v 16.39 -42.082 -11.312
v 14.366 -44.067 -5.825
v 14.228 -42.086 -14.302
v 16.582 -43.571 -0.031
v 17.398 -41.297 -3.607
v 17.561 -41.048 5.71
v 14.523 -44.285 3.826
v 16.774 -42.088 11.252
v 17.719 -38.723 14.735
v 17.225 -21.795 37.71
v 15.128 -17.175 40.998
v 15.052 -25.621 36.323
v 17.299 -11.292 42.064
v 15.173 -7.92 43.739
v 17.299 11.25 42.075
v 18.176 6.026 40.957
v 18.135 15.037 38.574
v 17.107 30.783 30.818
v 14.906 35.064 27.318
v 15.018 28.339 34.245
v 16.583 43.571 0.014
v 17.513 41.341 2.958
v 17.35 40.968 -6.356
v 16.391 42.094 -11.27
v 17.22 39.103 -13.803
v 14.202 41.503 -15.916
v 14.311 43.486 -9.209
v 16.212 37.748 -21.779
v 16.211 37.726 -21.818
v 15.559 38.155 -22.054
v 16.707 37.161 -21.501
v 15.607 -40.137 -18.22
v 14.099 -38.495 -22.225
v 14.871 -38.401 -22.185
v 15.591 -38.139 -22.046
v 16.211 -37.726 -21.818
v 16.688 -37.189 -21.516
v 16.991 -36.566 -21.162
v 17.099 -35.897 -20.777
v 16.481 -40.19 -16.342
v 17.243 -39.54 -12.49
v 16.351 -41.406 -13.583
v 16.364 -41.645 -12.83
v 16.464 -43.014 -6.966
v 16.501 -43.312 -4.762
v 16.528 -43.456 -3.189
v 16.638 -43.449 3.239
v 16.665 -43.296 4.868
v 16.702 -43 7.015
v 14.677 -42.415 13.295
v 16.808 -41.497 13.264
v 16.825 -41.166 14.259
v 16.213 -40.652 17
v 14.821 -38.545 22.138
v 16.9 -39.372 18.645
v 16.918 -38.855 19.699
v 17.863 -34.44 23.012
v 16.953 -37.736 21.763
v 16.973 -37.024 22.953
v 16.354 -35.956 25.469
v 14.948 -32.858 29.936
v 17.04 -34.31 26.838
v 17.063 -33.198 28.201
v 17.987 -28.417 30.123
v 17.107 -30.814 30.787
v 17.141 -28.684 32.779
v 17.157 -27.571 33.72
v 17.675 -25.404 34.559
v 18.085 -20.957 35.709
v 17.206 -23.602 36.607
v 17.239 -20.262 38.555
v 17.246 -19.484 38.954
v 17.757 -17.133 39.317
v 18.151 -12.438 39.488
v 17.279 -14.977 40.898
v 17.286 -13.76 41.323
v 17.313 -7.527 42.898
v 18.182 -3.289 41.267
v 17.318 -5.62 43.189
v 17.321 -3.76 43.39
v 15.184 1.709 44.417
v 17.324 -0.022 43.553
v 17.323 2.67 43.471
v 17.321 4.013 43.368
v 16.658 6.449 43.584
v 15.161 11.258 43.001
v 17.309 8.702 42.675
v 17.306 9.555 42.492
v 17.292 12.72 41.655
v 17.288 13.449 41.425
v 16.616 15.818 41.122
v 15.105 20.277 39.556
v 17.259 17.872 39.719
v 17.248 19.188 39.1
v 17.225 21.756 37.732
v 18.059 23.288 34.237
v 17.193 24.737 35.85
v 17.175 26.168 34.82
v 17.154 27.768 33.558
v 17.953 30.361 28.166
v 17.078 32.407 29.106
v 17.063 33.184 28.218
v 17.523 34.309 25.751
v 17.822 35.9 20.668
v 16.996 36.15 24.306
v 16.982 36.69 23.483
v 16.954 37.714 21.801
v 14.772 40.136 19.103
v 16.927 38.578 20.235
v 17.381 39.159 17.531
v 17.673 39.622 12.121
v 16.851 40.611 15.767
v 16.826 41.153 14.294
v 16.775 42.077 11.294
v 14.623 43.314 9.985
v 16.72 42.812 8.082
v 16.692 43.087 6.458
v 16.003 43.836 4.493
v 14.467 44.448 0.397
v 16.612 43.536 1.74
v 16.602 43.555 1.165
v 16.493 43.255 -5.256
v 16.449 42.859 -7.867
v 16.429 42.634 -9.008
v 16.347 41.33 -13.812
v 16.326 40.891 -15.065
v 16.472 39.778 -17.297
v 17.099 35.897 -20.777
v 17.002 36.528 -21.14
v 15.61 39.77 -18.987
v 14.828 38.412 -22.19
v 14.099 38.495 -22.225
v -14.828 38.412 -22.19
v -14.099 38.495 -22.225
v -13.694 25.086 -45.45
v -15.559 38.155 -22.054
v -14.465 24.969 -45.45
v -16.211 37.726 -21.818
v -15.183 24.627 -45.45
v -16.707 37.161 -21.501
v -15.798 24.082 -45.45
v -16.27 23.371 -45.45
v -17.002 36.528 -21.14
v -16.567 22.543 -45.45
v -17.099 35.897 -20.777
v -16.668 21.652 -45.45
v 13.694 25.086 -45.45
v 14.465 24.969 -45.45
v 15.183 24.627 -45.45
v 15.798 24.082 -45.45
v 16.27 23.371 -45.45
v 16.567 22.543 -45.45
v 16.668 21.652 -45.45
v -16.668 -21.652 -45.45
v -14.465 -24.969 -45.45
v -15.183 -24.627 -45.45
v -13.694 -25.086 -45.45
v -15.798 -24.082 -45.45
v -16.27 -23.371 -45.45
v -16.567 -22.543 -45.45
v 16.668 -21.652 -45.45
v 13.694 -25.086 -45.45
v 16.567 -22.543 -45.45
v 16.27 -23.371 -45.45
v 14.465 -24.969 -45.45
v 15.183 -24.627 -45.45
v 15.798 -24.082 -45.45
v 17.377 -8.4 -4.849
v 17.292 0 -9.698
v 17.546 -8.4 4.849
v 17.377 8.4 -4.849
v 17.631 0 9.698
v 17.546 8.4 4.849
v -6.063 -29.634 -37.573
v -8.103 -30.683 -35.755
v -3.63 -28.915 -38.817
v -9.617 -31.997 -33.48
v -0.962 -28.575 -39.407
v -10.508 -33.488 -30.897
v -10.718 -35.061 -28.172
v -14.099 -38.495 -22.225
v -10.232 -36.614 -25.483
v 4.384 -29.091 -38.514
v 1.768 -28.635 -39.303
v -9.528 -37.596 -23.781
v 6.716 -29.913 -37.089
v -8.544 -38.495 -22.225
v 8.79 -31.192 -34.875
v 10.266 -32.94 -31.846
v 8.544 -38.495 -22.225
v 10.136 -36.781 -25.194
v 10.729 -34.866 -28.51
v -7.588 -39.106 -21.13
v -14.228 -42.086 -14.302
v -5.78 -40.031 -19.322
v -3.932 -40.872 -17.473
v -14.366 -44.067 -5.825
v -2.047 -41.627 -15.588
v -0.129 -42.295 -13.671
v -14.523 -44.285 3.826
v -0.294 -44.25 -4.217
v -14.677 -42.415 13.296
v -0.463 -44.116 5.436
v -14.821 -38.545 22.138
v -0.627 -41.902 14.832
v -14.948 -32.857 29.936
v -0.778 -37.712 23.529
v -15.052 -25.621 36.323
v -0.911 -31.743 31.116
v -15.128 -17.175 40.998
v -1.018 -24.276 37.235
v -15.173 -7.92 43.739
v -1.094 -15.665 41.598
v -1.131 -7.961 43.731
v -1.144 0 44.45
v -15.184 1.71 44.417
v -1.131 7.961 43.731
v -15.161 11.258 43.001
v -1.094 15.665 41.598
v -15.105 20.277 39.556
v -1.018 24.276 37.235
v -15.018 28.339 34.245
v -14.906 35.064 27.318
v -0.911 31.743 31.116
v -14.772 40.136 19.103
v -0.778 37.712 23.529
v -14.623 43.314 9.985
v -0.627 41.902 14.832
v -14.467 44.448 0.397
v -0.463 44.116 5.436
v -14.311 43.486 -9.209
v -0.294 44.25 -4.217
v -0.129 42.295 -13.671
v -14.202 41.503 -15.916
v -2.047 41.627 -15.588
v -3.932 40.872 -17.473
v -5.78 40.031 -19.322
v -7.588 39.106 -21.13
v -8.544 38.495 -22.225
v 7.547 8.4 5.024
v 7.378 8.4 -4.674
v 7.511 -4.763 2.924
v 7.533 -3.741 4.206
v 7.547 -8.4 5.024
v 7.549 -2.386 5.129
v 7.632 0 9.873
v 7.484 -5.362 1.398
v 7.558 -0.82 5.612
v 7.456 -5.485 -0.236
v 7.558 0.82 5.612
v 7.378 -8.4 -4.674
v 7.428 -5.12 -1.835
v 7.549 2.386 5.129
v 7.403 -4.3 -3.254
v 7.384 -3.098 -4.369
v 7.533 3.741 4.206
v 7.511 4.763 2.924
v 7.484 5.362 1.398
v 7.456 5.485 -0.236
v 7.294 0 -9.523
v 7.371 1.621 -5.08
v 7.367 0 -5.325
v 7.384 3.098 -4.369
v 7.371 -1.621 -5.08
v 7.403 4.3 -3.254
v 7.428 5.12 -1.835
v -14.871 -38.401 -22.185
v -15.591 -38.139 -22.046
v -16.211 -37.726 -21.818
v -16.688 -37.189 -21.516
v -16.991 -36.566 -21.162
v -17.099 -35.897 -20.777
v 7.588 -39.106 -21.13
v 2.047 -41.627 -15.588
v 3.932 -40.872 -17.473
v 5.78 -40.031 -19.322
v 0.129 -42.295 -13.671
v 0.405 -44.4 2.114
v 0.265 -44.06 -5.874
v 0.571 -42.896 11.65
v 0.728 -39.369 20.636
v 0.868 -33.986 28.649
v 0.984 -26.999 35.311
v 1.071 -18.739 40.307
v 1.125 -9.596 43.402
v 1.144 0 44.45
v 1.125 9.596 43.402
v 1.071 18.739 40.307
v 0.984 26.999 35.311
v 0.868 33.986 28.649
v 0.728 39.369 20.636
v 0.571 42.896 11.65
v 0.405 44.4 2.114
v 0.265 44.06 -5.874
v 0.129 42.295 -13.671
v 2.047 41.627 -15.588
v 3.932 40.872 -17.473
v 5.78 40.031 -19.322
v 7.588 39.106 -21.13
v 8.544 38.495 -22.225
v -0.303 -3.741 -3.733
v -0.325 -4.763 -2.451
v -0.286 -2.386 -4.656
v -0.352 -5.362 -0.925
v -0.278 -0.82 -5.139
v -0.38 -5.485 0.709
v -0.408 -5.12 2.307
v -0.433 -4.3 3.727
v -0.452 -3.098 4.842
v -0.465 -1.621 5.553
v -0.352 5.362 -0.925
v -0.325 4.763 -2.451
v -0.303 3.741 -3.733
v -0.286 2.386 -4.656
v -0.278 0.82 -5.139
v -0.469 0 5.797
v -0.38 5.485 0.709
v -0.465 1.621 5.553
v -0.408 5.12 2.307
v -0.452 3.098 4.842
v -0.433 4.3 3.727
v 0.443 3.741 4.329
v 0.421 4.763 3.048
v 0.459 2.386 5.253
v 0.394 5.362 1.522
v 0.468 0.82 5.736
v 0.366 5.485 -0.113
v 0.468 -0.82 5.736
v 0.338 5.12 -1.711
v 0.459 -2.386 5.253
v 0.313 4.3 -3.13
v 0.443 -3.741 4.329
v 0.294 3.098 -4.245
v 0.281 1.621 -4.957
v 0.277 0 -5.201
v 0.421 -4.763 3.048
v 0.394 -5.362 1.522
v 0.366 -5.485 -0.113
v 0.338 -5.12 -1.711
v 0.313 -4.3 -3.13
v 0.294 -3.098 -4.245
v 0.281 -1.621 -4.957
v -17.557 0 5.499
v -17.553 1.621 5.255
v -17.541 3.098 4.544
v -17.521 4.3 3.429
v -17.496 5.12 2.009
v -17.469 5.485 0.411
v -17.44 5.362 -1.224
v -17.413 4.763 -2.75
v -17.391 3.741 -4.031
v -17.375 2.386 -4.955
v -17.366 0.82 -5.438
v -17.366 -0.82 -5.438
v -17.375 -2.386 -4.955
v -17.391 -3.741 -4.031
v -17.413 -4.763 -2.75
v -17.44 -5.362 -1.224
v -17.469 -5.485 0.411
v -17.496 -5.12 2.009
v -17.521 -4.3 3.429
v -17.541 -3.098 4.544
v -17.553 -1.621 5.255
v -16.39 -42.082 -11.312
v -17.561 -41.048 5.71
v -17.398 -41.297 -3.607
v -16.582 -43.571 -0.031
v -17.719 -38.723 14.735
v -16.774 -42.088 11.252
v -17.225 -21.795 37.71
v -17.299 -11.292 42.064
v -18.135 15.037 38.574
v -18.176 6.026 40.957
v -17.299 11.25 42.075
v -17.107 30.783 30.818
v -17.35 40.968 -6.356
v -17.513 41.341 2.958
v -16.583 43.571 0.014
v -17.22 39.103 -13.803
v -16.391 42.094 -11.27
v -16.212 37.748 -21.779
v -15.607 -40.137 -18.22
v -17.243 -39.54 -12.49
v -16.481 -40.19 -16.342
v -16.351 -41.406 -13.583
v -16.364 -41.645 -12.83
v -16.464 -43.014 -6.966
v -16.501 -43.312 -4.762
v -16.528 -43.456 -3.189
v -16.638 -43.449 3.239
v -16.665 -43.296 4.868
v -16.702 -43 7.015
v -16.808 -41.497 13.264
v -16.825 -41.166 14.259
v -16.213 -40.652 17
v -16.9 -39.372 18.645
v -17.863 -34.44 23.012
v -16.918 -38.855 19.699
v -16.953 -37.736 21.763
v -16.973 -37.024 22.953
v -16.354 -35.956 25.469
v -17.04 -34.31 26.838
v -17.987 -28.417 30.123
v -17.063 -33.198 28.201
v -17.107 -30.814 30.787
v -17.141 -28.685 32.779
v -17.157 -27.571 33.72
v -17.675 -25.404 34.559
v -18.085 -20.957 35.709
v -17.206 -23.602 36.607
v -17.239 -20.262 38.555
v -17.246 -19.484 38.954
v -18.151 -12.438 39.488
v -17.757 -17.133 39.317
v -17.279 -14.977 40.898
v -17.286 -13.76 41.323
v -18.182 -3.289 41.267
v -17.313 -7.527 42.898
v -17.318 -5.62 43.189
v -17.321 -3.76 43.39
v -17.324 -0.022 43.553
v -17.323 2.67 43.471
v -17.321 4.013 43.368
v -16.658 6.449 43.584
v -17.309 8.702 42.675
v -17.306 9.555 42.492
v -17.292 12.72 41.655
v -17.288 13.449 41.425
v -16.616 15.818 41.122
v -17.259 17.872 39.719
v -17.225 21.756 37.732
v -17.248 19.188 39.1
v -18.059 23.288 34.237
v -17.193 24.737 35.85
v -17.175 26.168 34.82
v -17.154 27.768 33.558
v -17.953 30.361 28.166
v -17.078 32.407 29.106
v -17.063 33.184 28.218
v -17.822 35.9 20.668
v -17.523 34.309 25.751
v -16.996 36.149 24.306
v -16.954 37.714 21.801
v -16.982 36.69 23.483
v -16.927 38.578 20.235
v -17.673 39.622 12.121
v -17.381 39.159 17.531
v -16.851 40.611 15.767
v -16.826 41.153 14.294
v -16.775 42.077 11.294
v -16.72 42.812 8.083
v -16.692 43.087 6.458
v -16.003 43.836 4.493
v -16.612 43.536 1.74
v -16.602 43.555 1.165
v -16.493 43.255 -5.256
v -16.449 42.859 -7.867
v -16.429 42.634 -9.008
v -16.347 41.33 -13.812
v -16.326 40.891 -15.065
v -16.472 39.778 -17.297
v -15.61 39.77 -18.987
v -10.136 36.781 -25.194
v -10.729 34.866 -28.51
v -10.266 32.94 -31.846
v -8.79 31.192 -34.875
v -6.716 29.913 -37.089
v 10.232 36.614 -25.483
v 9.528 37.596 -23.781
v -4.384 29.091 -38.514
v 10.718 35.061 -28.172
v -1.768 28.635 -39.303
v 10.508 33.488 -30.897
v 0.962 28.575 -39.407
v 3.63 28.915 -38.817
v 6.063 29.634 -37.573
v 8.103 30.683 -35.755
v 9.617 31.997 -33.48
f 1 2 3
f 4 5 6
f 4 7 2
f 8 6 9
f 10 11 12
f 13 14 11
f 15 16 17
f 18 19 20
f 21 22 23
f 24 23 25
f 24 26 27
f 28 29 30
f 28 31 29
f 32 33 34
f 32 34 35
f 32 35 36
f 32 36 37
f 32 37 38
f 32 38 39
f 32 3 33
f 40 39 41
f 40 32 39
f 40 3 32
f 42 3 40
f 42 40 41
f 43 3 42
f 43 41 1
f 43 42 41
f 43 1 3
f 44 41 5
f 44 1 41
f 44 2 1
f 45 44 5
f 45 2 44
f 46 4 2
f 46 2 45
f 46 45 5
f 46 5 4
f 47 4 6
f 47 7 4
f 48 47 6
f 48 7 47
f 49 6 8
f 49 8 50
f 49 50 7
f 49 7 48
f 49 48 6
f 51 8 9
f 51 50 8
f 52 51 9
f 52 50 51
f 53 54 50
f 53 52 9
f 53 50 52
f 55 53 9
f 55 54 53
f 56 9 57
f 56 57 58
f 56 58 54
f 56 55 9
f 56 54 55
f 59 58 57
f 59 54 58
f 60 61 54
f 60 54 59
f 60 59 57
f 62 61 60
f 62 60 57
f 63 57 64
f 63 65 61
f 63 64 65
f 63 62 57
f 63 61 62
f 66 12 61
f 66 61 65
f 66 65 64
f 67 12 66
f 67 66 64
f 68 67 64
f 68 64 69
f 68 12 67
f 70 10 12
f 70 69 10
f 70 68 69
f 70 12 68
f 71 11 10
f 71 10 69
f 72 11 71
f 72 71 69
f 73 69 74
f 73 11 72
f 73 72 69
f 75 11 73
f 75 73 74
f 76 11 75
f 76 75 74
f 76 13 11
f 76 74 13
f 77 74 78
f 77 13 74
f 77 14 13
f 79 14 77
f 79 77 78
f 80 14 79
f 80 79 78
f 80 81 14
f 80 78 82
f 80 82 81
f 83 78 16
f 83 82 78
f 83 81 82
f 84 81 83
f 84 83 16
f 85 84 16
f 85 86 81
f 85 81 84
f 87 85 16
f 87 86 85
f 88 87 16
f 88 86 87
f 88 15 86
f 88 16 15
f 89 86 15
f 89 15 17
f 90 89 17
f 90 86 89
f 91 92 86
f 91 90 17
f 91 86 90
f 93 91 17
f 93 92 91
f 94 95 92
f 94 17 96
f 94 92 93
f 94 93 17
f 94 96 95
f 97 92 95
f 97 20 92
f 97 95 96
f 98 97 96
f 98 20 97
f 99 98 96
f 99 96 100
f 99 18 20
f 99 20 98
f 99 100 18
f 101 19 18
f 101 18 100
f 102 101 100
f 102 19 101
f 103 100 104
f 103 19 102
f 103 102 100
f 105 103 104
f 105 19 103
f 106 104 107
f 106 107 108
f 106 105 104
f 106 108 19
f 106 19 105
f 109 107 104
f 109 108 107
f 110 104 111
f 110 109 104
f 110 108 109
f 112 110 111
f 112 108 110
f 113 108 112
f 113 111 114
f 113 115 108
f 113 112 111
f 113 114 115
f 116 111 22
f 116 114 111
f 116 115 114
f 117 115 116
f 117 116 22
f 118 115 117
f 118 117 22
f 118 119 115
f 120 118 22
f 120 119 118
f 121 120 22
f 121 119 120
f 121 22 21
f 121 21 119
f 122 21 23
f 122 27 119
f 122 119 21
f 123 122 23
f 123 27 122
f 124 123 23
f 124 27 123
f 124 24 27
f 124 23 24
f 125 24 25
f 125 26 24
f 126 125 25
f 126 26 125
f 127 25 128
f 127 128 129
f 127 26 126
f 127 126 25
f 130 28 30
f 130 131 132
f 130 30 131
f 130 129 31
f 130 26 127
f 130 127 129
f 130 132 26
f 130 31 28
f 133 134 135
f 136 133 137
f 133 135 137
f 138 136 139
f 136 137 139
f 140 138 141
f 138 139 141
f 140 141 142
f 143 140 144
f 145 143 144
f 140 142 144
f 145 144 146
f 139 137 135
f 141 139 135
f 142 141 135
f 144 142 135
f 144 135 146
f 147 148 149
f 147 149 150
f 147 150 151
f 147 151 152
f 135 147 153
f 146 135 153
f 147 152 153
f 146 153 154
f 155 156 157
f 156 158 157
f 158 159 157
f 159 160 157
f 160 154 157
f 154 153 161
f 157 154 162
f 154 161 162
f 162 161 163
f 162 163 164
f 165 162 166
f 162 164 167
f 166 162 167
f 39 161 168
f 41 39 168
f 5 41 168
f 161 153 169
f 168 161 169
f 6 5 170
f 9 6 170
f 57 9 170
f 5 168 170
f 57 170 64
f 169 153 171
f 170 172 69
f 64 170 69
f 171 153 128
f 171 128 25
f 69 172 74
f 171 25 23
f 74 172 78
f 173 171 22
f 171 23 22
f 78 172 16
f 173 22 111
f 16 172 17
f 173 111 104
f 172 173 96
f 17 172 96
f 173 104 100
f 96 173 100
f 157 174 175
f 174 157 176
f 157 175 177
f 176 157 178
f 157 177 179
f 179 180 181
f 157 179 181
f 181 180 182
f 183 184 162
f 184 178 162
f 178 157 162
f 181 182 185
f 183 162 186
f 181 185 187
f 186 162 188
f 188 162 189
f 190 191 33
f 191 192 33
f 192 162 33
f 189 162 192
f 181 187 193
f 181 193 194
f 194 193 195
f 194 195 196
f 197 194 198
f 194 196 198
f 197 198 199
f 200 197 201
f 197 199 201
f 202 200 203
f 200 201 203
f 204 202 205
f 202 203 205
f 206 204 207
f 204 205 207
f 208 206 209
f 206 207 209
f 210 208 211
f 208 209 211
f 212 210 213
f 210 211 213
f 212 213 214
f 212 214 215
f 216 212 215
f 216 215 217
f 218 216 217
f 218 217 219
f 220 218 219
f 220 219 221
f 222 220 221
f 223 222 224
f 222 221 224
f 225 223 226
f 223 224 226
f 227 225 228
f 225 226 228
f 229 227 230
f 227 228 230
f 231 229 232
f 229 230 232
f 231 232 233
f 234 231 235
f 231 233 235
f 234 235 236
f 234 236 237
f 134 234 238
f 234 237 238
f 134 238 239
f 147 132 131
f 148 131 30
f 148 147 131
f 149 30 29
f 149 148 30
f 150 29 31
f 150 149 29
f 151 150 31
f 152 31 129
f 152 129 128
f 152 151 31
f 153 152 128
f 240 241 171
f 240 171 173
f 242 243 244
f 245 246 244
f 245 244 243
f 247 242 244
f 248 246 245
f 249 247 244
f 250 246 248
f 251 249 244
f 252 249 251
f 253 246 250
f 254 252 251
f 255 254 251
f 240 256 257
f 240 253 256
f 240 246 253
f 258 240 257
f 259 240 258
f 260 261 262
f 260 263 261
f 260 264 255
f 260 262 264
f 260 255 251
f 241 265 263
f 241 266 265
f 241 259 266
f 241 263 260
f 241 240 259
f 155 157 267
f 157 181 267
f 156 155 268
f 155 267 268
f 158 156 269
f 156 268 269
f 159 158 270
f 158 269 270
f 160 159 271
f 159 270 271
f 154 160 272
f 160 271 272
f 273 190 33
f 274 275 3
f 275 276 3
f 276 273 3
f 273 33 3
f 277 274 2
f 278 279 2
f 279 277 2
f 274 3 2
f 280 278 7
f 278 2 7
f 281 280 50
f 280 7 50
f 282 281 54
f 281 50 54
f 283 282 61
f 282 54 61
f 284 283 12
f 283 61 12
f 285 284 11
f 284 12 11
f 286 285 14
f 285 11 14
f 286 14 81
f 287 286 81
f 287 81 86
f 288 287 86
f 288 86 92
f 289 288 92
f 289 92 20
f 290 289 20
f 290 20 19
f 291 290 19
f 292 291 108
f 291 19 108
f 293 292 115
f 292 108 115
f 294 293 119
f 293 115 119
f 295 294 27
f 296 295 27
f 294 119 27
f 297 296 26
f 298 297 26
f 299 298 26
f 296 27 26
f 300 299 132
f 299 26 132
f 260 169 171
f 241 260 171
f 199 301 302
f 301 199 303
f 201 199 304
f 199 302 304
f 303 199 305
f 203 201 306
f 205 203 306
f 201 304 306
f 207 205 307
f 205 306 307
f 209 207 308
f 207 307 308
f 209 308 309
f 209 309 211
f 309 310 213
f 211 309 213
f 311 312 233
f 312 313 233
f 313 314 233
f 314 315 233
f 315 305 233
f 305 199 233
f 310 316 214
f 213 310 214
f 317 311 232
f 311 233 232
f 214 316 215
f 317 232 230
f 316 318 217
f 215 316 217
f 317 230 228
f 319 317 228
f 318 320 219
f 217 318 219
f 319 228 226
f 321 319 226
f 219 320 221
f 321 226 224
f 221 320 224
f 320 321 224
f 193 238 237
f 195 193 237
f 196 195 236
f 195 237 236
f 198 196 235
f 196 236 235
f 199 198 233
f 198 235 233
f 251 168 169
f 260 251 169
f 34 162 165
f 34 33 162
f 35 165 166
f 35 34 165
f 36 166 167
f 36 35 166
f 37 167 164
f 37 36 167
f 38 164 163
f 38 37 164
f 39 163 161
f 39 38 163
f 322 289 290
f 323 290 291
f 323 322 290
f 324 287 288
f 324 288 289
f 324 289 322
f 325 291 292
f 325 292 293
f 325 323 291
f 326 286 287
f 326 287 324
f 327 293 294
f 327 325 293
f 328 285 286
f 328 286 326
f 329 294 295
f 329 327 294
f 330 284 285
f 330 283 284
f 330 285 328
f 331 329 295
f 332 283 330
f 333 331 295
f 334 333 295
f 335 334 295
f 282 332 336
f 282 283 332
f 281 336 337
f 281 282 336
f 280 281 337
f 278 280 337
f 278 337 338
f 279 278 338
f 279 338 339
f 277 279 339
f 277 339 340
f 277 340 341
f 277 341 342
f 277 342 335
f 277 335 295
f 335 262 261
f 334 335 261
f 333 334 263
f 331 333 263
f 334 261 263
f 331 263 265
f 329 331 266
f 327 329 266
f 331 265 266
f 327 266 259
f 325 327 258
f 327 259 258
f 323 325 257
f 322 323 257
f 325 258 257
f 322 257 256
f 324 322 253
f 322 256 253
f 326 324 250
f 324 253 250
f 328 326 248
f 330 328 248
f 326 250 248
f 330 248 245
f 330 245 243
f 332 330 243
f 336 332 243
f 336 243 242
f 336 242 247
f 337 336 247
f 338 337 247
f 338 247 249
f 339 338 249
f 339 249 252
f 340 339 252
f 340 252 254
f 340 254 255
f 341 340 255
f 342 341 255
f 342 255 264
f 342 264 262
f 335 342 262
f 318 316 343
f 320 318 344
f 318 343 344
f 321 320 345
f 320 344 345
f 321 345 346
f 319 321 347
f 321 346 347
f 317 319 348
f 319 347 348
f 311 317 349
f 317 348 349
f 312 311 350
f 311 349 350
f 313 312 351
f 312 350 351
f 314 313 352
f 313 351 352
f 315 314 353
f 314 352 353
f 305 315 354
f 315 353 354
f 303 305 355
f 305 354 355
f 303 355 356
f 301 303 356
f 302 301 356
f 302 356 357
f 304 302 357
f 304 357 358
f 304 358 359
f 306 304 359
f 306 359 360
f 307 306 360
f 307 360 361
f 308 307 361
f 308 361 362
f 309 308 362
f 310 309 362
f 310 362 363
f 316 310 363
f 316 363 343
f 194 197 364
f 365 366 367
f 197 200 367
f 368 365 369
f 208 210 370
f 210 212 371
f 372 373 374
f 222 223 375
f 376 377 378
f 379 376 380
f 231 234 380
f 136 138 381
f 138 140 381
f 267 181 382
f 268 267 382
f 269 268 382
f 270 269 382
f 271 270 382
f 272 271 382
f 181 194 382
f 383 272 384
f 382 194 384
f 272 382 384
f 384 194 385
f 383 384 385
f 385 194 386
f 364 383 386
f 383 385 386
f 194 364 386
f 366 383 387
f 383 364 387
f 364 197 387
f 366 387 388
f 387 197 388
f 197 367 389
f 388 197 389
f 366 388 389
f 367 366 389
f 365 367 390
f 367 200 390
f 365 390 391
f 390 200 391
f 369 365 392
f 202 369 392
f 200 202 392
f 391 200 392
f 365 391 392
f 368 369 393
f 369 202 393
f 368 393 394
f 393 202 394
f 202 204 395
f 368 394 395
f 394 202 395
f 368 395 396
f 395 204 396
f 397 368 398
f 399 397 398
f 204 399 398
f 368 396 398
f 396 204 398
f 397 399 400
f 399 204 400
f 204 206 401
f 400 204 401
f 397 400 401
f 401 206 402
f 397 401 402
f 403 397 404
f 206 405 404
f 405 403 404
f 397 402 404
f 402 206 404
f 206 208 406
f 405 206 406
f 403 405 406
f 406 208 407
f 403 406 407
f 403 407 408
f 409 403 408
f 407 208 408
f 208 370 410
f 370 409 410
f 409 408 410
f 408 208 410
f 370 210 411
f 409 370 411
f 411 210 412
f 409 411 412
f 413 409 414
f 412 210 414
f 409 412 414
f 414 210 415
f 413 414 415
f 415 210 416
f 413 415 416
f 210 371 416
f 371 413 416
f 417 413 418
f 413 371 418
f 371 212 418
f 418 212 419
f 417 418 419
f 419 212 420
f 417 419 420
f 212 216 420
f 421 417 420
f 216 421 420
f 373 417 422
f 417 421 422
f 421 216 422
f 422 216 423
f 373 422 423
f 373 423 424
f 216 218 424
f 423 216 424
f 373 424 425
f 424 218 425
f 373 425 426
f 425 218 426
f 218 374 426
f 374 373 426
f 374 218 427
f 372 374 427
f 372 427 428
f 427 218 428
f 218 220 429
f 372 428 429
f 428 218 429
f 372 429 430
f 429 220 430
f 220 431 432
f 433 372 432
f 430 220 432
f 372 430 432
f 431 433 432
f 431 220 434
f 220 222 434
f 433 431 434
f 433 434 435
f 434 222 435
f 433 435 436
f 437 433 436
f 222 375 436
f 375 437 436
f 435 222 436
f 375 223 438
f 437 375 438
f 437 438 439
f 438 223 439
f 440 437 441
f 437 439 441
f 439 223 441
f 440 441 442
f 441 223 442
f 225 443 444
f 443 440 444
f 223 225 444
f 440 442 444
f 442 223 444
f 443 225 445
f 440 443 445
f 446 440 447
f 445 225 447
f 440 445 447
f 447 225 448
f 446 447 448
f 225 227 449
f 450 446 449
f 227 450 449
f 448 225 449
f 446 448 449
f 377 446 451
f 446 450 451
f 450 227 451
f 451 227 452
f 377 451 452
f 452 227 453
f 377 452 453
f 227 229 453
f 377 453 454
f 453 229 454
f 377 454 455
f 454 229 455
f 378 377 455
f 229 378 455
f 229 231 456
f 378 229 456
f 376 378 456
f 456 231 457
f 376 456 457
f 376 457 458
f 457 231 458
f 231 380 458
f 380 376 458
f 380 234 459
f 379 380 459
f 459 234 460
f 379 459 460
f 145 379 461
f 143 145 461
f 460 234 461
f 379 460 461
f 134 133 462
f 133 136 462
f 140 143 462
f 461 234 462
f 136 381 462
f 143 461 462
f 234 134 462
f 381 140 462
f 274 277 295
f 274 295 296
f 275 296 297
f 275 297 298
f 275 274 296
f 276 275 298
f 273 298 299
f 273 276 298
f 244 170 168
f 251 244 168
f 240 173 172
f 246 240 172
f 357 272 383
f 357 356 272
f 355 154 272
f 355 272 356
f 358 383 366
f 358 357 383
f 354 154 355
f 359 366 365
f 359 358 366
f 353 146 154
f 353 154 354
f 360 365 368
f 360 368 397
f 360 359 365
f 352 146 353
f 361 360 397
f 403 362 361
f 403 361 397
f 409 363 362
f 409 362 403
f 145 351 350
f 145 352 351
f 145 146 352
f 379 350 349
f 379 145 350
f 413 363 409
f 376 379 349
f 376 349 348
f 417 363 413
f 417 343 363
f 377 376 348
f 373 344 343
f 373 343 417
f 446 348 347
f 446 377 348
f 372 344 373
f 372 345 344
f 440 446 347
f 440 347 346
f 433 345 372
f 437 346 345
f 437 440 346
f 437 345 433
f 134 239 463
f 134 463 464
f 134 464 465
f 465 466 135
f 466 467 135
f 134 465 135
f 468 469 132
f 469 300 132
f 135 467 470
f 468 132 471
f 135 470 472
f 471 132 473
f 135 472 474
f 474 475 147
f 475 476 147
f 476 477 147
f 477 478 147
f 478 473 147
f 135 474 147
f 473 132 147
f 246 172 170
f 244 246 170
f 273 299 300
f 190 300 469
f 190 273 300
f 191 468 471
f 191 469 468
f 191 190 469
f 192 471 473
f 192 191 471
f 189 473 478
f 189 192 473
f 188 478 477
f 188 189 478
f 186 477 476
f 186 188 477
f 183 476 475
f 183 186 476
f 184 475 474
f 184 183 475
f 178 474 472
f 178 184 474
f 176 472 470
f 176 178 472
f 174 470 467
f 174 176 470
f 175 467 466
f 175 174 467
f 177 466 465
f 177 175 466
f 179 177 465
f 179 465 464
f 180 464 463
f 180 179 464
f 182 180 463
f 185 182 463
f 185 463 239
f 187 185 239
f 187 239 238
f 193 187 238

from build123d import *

# Parameters (mm, degrees)
BOSS_EXTRUDE1_DEPTH     = 16.668
CUT_EXTRUDE1_DEPTH      = 45.45
CUT_EXTRUDE1_DEPTH_BACK = 45.45
DRAFT1_ANGLE            = 1
CUT_EXTRUDE2_REACH      = 38.469
SKETCH3_R               = 5.5
CUT_EXTRUDE3_DEPTH      = 10
CUT_EXTRUDE4_REACH      = 38.469
SKETCH5_R               = 5.5
FILLET1_R               = 3


with BuildPart() as part:
    # Sketch1 → Boss-Extrude1 (new body, symmetric)
    with BuildSketch(Plane(origin=(0, 0, 0), x_dir=(0, 0, -1), z_dir=(1, 0, 0))):
        with BuildLine():
            Line((22.225, 38.494829198), (45.45, 25.085869196))
            Line((45.45, 25.085869196), (45.45, -25.085869196))
            Line((45.45, -25.085869196), (22.225, -38.494829198))
            ThreePointArc((22.225, -38.494829198), (-44.45, 0), (22.225, 38.494829198))
        make_face()
    extrude(amount=BOSS_EXTRUDE1_DEPTH, both=True)

    # Sketch2 → Cut-Extrude1 (cut, two sides)
    with BuildSketch(Plane(origin=(0, 0, 0), x_dir=(1, 0, 0), z_dir=(0, 1, 0))) as cut_extrude1_sk:
        with BuildLine():
            Line((-7.588316422, 21.130183578), (-0.129046134, 13.670913289))
            Line((-0.129046134, 13.670913289), (-1.143550449, -44.45))
            Line((-1.143550449, -44.45), (1.143550449, -44.45))
            Line((1.143550449, -44.45), (0.129046134, 13.670913289))
            Line((0.129046134, 13.670913289), (7.588316422, 21.130183578))
            ThreePointArc((7.588316422, 21.130183578), (0, 39.45), (-7.588316422, 21.130183578))
        make_face()
    extrude(amount=CUT_EXTRUDE1_DEPTH, mode=Mode.SUBTRACT)
    extrude(cut_extrude1_sk.sketch, amount=-CUT_EXTRUDE1_DEPTH_BACK, mode=Mode.SUBTRACT)

    # Draft1
    draft1_faces = [part.faces().sort_by_distance(p)[0] for p in [
        (16.668, 0, -1.658648034),
        (-16.668, 0, -1.658648034),
    ]]
    draft(draft1_faces, Plane(origin=(16.668, 25.085869196, -45.45), x_dir=(-1, 0, 0), z_dir=(0, 0, -1)), DRAFT1_ANGLE)

    # Sketch3 → Cut-Extrude2 (cut, up to next)
    with BuildSketch(Plane(origin=(17.456014215, 0, -0.304695862), x_dir=(-0.017452406, 0, -0.999847695), z_dir=(0.999847695, 0, -0.017452406)), mode=Mode.PRIVATE) as cut_extrude2_sk1:
        with Locations((-0.304742275, 0)):
            Circle(SKETCH3_R)
    cut_extrude2_tool1 = extrude(cut_extrude2_sk1.sketch, amount=-CUT_EXTRUDE2_REACH, mode=Mode.PRIVATE) & part.part
    add(cut_extrude2_tool1.solids().sort_by_distance((17.461333, 0, 0))[0], mode=Mode.SUBTRACT)

    # Sketch4 → Cut-Extrude3 (cut)
    with BuildSketch(Plane(origin=(17.456014215, 0, -0.304695862), x_dir=(-0.017452406, 0, -0.999847695), z_dir=(0.999847695, 0, -0.017452406))):
        Polygon((9.394742247, 0), (4.544999986, 8.4), (-5.154484536, 8.4), (-10.004226798, 0), (-5.154484536, -8.4), (4.544999986, -8.4), align=None)
    extrude(amount=-CUT_EXTRUDE3_DEPTH, mode=Mode.SUBTRACT)

    # Sketch5 → Cut-Extrude4 (cut, up to next)
    with BuildSketch(Plane(origin=(-17.456014215, 0, -0.304695862), x_dir=(-0.017452406, 0, 0.999847695), z_dir=(-0.999847695, 0, -0.017452406)), mode=Mode.PRIVATE) as cut_extrude4_sk1:
        with Locations((0.304742275, 0)):
            Circle(SKETCH5_R)
    cut_extrude4_tool1 = extrude(cut_extrude4_sk1.sketch, amount=-CUT_EXTRUDE4_REACH, mode=Mode.PRIVATE) & part.part
    add(cut_extrude4_tool1.solids().sort_by_distance((-17.461333, 0, 0))[0], mode=Mode.SUBTRACT)

    # Fillet1
    fillet1_edges = [part.edges().sort_by_distance(p)[0] for p in [
        (16.870696941, 31.790349197, -33.8375),
        (18.237210337, 0.000220739, 44.449999999),
        (-16.870696941, 31.790349197, -33.8375),
        (-16.870697084, -31.790353899, -33.837491856),
        (-18.237210337, 9.404e-06, 44.45),
        (16.870700278, -31.790459554, -33.837308856),
    ]]
    fillet(fillet1_edges, radius=FILLET1_R)


solid = part.part
